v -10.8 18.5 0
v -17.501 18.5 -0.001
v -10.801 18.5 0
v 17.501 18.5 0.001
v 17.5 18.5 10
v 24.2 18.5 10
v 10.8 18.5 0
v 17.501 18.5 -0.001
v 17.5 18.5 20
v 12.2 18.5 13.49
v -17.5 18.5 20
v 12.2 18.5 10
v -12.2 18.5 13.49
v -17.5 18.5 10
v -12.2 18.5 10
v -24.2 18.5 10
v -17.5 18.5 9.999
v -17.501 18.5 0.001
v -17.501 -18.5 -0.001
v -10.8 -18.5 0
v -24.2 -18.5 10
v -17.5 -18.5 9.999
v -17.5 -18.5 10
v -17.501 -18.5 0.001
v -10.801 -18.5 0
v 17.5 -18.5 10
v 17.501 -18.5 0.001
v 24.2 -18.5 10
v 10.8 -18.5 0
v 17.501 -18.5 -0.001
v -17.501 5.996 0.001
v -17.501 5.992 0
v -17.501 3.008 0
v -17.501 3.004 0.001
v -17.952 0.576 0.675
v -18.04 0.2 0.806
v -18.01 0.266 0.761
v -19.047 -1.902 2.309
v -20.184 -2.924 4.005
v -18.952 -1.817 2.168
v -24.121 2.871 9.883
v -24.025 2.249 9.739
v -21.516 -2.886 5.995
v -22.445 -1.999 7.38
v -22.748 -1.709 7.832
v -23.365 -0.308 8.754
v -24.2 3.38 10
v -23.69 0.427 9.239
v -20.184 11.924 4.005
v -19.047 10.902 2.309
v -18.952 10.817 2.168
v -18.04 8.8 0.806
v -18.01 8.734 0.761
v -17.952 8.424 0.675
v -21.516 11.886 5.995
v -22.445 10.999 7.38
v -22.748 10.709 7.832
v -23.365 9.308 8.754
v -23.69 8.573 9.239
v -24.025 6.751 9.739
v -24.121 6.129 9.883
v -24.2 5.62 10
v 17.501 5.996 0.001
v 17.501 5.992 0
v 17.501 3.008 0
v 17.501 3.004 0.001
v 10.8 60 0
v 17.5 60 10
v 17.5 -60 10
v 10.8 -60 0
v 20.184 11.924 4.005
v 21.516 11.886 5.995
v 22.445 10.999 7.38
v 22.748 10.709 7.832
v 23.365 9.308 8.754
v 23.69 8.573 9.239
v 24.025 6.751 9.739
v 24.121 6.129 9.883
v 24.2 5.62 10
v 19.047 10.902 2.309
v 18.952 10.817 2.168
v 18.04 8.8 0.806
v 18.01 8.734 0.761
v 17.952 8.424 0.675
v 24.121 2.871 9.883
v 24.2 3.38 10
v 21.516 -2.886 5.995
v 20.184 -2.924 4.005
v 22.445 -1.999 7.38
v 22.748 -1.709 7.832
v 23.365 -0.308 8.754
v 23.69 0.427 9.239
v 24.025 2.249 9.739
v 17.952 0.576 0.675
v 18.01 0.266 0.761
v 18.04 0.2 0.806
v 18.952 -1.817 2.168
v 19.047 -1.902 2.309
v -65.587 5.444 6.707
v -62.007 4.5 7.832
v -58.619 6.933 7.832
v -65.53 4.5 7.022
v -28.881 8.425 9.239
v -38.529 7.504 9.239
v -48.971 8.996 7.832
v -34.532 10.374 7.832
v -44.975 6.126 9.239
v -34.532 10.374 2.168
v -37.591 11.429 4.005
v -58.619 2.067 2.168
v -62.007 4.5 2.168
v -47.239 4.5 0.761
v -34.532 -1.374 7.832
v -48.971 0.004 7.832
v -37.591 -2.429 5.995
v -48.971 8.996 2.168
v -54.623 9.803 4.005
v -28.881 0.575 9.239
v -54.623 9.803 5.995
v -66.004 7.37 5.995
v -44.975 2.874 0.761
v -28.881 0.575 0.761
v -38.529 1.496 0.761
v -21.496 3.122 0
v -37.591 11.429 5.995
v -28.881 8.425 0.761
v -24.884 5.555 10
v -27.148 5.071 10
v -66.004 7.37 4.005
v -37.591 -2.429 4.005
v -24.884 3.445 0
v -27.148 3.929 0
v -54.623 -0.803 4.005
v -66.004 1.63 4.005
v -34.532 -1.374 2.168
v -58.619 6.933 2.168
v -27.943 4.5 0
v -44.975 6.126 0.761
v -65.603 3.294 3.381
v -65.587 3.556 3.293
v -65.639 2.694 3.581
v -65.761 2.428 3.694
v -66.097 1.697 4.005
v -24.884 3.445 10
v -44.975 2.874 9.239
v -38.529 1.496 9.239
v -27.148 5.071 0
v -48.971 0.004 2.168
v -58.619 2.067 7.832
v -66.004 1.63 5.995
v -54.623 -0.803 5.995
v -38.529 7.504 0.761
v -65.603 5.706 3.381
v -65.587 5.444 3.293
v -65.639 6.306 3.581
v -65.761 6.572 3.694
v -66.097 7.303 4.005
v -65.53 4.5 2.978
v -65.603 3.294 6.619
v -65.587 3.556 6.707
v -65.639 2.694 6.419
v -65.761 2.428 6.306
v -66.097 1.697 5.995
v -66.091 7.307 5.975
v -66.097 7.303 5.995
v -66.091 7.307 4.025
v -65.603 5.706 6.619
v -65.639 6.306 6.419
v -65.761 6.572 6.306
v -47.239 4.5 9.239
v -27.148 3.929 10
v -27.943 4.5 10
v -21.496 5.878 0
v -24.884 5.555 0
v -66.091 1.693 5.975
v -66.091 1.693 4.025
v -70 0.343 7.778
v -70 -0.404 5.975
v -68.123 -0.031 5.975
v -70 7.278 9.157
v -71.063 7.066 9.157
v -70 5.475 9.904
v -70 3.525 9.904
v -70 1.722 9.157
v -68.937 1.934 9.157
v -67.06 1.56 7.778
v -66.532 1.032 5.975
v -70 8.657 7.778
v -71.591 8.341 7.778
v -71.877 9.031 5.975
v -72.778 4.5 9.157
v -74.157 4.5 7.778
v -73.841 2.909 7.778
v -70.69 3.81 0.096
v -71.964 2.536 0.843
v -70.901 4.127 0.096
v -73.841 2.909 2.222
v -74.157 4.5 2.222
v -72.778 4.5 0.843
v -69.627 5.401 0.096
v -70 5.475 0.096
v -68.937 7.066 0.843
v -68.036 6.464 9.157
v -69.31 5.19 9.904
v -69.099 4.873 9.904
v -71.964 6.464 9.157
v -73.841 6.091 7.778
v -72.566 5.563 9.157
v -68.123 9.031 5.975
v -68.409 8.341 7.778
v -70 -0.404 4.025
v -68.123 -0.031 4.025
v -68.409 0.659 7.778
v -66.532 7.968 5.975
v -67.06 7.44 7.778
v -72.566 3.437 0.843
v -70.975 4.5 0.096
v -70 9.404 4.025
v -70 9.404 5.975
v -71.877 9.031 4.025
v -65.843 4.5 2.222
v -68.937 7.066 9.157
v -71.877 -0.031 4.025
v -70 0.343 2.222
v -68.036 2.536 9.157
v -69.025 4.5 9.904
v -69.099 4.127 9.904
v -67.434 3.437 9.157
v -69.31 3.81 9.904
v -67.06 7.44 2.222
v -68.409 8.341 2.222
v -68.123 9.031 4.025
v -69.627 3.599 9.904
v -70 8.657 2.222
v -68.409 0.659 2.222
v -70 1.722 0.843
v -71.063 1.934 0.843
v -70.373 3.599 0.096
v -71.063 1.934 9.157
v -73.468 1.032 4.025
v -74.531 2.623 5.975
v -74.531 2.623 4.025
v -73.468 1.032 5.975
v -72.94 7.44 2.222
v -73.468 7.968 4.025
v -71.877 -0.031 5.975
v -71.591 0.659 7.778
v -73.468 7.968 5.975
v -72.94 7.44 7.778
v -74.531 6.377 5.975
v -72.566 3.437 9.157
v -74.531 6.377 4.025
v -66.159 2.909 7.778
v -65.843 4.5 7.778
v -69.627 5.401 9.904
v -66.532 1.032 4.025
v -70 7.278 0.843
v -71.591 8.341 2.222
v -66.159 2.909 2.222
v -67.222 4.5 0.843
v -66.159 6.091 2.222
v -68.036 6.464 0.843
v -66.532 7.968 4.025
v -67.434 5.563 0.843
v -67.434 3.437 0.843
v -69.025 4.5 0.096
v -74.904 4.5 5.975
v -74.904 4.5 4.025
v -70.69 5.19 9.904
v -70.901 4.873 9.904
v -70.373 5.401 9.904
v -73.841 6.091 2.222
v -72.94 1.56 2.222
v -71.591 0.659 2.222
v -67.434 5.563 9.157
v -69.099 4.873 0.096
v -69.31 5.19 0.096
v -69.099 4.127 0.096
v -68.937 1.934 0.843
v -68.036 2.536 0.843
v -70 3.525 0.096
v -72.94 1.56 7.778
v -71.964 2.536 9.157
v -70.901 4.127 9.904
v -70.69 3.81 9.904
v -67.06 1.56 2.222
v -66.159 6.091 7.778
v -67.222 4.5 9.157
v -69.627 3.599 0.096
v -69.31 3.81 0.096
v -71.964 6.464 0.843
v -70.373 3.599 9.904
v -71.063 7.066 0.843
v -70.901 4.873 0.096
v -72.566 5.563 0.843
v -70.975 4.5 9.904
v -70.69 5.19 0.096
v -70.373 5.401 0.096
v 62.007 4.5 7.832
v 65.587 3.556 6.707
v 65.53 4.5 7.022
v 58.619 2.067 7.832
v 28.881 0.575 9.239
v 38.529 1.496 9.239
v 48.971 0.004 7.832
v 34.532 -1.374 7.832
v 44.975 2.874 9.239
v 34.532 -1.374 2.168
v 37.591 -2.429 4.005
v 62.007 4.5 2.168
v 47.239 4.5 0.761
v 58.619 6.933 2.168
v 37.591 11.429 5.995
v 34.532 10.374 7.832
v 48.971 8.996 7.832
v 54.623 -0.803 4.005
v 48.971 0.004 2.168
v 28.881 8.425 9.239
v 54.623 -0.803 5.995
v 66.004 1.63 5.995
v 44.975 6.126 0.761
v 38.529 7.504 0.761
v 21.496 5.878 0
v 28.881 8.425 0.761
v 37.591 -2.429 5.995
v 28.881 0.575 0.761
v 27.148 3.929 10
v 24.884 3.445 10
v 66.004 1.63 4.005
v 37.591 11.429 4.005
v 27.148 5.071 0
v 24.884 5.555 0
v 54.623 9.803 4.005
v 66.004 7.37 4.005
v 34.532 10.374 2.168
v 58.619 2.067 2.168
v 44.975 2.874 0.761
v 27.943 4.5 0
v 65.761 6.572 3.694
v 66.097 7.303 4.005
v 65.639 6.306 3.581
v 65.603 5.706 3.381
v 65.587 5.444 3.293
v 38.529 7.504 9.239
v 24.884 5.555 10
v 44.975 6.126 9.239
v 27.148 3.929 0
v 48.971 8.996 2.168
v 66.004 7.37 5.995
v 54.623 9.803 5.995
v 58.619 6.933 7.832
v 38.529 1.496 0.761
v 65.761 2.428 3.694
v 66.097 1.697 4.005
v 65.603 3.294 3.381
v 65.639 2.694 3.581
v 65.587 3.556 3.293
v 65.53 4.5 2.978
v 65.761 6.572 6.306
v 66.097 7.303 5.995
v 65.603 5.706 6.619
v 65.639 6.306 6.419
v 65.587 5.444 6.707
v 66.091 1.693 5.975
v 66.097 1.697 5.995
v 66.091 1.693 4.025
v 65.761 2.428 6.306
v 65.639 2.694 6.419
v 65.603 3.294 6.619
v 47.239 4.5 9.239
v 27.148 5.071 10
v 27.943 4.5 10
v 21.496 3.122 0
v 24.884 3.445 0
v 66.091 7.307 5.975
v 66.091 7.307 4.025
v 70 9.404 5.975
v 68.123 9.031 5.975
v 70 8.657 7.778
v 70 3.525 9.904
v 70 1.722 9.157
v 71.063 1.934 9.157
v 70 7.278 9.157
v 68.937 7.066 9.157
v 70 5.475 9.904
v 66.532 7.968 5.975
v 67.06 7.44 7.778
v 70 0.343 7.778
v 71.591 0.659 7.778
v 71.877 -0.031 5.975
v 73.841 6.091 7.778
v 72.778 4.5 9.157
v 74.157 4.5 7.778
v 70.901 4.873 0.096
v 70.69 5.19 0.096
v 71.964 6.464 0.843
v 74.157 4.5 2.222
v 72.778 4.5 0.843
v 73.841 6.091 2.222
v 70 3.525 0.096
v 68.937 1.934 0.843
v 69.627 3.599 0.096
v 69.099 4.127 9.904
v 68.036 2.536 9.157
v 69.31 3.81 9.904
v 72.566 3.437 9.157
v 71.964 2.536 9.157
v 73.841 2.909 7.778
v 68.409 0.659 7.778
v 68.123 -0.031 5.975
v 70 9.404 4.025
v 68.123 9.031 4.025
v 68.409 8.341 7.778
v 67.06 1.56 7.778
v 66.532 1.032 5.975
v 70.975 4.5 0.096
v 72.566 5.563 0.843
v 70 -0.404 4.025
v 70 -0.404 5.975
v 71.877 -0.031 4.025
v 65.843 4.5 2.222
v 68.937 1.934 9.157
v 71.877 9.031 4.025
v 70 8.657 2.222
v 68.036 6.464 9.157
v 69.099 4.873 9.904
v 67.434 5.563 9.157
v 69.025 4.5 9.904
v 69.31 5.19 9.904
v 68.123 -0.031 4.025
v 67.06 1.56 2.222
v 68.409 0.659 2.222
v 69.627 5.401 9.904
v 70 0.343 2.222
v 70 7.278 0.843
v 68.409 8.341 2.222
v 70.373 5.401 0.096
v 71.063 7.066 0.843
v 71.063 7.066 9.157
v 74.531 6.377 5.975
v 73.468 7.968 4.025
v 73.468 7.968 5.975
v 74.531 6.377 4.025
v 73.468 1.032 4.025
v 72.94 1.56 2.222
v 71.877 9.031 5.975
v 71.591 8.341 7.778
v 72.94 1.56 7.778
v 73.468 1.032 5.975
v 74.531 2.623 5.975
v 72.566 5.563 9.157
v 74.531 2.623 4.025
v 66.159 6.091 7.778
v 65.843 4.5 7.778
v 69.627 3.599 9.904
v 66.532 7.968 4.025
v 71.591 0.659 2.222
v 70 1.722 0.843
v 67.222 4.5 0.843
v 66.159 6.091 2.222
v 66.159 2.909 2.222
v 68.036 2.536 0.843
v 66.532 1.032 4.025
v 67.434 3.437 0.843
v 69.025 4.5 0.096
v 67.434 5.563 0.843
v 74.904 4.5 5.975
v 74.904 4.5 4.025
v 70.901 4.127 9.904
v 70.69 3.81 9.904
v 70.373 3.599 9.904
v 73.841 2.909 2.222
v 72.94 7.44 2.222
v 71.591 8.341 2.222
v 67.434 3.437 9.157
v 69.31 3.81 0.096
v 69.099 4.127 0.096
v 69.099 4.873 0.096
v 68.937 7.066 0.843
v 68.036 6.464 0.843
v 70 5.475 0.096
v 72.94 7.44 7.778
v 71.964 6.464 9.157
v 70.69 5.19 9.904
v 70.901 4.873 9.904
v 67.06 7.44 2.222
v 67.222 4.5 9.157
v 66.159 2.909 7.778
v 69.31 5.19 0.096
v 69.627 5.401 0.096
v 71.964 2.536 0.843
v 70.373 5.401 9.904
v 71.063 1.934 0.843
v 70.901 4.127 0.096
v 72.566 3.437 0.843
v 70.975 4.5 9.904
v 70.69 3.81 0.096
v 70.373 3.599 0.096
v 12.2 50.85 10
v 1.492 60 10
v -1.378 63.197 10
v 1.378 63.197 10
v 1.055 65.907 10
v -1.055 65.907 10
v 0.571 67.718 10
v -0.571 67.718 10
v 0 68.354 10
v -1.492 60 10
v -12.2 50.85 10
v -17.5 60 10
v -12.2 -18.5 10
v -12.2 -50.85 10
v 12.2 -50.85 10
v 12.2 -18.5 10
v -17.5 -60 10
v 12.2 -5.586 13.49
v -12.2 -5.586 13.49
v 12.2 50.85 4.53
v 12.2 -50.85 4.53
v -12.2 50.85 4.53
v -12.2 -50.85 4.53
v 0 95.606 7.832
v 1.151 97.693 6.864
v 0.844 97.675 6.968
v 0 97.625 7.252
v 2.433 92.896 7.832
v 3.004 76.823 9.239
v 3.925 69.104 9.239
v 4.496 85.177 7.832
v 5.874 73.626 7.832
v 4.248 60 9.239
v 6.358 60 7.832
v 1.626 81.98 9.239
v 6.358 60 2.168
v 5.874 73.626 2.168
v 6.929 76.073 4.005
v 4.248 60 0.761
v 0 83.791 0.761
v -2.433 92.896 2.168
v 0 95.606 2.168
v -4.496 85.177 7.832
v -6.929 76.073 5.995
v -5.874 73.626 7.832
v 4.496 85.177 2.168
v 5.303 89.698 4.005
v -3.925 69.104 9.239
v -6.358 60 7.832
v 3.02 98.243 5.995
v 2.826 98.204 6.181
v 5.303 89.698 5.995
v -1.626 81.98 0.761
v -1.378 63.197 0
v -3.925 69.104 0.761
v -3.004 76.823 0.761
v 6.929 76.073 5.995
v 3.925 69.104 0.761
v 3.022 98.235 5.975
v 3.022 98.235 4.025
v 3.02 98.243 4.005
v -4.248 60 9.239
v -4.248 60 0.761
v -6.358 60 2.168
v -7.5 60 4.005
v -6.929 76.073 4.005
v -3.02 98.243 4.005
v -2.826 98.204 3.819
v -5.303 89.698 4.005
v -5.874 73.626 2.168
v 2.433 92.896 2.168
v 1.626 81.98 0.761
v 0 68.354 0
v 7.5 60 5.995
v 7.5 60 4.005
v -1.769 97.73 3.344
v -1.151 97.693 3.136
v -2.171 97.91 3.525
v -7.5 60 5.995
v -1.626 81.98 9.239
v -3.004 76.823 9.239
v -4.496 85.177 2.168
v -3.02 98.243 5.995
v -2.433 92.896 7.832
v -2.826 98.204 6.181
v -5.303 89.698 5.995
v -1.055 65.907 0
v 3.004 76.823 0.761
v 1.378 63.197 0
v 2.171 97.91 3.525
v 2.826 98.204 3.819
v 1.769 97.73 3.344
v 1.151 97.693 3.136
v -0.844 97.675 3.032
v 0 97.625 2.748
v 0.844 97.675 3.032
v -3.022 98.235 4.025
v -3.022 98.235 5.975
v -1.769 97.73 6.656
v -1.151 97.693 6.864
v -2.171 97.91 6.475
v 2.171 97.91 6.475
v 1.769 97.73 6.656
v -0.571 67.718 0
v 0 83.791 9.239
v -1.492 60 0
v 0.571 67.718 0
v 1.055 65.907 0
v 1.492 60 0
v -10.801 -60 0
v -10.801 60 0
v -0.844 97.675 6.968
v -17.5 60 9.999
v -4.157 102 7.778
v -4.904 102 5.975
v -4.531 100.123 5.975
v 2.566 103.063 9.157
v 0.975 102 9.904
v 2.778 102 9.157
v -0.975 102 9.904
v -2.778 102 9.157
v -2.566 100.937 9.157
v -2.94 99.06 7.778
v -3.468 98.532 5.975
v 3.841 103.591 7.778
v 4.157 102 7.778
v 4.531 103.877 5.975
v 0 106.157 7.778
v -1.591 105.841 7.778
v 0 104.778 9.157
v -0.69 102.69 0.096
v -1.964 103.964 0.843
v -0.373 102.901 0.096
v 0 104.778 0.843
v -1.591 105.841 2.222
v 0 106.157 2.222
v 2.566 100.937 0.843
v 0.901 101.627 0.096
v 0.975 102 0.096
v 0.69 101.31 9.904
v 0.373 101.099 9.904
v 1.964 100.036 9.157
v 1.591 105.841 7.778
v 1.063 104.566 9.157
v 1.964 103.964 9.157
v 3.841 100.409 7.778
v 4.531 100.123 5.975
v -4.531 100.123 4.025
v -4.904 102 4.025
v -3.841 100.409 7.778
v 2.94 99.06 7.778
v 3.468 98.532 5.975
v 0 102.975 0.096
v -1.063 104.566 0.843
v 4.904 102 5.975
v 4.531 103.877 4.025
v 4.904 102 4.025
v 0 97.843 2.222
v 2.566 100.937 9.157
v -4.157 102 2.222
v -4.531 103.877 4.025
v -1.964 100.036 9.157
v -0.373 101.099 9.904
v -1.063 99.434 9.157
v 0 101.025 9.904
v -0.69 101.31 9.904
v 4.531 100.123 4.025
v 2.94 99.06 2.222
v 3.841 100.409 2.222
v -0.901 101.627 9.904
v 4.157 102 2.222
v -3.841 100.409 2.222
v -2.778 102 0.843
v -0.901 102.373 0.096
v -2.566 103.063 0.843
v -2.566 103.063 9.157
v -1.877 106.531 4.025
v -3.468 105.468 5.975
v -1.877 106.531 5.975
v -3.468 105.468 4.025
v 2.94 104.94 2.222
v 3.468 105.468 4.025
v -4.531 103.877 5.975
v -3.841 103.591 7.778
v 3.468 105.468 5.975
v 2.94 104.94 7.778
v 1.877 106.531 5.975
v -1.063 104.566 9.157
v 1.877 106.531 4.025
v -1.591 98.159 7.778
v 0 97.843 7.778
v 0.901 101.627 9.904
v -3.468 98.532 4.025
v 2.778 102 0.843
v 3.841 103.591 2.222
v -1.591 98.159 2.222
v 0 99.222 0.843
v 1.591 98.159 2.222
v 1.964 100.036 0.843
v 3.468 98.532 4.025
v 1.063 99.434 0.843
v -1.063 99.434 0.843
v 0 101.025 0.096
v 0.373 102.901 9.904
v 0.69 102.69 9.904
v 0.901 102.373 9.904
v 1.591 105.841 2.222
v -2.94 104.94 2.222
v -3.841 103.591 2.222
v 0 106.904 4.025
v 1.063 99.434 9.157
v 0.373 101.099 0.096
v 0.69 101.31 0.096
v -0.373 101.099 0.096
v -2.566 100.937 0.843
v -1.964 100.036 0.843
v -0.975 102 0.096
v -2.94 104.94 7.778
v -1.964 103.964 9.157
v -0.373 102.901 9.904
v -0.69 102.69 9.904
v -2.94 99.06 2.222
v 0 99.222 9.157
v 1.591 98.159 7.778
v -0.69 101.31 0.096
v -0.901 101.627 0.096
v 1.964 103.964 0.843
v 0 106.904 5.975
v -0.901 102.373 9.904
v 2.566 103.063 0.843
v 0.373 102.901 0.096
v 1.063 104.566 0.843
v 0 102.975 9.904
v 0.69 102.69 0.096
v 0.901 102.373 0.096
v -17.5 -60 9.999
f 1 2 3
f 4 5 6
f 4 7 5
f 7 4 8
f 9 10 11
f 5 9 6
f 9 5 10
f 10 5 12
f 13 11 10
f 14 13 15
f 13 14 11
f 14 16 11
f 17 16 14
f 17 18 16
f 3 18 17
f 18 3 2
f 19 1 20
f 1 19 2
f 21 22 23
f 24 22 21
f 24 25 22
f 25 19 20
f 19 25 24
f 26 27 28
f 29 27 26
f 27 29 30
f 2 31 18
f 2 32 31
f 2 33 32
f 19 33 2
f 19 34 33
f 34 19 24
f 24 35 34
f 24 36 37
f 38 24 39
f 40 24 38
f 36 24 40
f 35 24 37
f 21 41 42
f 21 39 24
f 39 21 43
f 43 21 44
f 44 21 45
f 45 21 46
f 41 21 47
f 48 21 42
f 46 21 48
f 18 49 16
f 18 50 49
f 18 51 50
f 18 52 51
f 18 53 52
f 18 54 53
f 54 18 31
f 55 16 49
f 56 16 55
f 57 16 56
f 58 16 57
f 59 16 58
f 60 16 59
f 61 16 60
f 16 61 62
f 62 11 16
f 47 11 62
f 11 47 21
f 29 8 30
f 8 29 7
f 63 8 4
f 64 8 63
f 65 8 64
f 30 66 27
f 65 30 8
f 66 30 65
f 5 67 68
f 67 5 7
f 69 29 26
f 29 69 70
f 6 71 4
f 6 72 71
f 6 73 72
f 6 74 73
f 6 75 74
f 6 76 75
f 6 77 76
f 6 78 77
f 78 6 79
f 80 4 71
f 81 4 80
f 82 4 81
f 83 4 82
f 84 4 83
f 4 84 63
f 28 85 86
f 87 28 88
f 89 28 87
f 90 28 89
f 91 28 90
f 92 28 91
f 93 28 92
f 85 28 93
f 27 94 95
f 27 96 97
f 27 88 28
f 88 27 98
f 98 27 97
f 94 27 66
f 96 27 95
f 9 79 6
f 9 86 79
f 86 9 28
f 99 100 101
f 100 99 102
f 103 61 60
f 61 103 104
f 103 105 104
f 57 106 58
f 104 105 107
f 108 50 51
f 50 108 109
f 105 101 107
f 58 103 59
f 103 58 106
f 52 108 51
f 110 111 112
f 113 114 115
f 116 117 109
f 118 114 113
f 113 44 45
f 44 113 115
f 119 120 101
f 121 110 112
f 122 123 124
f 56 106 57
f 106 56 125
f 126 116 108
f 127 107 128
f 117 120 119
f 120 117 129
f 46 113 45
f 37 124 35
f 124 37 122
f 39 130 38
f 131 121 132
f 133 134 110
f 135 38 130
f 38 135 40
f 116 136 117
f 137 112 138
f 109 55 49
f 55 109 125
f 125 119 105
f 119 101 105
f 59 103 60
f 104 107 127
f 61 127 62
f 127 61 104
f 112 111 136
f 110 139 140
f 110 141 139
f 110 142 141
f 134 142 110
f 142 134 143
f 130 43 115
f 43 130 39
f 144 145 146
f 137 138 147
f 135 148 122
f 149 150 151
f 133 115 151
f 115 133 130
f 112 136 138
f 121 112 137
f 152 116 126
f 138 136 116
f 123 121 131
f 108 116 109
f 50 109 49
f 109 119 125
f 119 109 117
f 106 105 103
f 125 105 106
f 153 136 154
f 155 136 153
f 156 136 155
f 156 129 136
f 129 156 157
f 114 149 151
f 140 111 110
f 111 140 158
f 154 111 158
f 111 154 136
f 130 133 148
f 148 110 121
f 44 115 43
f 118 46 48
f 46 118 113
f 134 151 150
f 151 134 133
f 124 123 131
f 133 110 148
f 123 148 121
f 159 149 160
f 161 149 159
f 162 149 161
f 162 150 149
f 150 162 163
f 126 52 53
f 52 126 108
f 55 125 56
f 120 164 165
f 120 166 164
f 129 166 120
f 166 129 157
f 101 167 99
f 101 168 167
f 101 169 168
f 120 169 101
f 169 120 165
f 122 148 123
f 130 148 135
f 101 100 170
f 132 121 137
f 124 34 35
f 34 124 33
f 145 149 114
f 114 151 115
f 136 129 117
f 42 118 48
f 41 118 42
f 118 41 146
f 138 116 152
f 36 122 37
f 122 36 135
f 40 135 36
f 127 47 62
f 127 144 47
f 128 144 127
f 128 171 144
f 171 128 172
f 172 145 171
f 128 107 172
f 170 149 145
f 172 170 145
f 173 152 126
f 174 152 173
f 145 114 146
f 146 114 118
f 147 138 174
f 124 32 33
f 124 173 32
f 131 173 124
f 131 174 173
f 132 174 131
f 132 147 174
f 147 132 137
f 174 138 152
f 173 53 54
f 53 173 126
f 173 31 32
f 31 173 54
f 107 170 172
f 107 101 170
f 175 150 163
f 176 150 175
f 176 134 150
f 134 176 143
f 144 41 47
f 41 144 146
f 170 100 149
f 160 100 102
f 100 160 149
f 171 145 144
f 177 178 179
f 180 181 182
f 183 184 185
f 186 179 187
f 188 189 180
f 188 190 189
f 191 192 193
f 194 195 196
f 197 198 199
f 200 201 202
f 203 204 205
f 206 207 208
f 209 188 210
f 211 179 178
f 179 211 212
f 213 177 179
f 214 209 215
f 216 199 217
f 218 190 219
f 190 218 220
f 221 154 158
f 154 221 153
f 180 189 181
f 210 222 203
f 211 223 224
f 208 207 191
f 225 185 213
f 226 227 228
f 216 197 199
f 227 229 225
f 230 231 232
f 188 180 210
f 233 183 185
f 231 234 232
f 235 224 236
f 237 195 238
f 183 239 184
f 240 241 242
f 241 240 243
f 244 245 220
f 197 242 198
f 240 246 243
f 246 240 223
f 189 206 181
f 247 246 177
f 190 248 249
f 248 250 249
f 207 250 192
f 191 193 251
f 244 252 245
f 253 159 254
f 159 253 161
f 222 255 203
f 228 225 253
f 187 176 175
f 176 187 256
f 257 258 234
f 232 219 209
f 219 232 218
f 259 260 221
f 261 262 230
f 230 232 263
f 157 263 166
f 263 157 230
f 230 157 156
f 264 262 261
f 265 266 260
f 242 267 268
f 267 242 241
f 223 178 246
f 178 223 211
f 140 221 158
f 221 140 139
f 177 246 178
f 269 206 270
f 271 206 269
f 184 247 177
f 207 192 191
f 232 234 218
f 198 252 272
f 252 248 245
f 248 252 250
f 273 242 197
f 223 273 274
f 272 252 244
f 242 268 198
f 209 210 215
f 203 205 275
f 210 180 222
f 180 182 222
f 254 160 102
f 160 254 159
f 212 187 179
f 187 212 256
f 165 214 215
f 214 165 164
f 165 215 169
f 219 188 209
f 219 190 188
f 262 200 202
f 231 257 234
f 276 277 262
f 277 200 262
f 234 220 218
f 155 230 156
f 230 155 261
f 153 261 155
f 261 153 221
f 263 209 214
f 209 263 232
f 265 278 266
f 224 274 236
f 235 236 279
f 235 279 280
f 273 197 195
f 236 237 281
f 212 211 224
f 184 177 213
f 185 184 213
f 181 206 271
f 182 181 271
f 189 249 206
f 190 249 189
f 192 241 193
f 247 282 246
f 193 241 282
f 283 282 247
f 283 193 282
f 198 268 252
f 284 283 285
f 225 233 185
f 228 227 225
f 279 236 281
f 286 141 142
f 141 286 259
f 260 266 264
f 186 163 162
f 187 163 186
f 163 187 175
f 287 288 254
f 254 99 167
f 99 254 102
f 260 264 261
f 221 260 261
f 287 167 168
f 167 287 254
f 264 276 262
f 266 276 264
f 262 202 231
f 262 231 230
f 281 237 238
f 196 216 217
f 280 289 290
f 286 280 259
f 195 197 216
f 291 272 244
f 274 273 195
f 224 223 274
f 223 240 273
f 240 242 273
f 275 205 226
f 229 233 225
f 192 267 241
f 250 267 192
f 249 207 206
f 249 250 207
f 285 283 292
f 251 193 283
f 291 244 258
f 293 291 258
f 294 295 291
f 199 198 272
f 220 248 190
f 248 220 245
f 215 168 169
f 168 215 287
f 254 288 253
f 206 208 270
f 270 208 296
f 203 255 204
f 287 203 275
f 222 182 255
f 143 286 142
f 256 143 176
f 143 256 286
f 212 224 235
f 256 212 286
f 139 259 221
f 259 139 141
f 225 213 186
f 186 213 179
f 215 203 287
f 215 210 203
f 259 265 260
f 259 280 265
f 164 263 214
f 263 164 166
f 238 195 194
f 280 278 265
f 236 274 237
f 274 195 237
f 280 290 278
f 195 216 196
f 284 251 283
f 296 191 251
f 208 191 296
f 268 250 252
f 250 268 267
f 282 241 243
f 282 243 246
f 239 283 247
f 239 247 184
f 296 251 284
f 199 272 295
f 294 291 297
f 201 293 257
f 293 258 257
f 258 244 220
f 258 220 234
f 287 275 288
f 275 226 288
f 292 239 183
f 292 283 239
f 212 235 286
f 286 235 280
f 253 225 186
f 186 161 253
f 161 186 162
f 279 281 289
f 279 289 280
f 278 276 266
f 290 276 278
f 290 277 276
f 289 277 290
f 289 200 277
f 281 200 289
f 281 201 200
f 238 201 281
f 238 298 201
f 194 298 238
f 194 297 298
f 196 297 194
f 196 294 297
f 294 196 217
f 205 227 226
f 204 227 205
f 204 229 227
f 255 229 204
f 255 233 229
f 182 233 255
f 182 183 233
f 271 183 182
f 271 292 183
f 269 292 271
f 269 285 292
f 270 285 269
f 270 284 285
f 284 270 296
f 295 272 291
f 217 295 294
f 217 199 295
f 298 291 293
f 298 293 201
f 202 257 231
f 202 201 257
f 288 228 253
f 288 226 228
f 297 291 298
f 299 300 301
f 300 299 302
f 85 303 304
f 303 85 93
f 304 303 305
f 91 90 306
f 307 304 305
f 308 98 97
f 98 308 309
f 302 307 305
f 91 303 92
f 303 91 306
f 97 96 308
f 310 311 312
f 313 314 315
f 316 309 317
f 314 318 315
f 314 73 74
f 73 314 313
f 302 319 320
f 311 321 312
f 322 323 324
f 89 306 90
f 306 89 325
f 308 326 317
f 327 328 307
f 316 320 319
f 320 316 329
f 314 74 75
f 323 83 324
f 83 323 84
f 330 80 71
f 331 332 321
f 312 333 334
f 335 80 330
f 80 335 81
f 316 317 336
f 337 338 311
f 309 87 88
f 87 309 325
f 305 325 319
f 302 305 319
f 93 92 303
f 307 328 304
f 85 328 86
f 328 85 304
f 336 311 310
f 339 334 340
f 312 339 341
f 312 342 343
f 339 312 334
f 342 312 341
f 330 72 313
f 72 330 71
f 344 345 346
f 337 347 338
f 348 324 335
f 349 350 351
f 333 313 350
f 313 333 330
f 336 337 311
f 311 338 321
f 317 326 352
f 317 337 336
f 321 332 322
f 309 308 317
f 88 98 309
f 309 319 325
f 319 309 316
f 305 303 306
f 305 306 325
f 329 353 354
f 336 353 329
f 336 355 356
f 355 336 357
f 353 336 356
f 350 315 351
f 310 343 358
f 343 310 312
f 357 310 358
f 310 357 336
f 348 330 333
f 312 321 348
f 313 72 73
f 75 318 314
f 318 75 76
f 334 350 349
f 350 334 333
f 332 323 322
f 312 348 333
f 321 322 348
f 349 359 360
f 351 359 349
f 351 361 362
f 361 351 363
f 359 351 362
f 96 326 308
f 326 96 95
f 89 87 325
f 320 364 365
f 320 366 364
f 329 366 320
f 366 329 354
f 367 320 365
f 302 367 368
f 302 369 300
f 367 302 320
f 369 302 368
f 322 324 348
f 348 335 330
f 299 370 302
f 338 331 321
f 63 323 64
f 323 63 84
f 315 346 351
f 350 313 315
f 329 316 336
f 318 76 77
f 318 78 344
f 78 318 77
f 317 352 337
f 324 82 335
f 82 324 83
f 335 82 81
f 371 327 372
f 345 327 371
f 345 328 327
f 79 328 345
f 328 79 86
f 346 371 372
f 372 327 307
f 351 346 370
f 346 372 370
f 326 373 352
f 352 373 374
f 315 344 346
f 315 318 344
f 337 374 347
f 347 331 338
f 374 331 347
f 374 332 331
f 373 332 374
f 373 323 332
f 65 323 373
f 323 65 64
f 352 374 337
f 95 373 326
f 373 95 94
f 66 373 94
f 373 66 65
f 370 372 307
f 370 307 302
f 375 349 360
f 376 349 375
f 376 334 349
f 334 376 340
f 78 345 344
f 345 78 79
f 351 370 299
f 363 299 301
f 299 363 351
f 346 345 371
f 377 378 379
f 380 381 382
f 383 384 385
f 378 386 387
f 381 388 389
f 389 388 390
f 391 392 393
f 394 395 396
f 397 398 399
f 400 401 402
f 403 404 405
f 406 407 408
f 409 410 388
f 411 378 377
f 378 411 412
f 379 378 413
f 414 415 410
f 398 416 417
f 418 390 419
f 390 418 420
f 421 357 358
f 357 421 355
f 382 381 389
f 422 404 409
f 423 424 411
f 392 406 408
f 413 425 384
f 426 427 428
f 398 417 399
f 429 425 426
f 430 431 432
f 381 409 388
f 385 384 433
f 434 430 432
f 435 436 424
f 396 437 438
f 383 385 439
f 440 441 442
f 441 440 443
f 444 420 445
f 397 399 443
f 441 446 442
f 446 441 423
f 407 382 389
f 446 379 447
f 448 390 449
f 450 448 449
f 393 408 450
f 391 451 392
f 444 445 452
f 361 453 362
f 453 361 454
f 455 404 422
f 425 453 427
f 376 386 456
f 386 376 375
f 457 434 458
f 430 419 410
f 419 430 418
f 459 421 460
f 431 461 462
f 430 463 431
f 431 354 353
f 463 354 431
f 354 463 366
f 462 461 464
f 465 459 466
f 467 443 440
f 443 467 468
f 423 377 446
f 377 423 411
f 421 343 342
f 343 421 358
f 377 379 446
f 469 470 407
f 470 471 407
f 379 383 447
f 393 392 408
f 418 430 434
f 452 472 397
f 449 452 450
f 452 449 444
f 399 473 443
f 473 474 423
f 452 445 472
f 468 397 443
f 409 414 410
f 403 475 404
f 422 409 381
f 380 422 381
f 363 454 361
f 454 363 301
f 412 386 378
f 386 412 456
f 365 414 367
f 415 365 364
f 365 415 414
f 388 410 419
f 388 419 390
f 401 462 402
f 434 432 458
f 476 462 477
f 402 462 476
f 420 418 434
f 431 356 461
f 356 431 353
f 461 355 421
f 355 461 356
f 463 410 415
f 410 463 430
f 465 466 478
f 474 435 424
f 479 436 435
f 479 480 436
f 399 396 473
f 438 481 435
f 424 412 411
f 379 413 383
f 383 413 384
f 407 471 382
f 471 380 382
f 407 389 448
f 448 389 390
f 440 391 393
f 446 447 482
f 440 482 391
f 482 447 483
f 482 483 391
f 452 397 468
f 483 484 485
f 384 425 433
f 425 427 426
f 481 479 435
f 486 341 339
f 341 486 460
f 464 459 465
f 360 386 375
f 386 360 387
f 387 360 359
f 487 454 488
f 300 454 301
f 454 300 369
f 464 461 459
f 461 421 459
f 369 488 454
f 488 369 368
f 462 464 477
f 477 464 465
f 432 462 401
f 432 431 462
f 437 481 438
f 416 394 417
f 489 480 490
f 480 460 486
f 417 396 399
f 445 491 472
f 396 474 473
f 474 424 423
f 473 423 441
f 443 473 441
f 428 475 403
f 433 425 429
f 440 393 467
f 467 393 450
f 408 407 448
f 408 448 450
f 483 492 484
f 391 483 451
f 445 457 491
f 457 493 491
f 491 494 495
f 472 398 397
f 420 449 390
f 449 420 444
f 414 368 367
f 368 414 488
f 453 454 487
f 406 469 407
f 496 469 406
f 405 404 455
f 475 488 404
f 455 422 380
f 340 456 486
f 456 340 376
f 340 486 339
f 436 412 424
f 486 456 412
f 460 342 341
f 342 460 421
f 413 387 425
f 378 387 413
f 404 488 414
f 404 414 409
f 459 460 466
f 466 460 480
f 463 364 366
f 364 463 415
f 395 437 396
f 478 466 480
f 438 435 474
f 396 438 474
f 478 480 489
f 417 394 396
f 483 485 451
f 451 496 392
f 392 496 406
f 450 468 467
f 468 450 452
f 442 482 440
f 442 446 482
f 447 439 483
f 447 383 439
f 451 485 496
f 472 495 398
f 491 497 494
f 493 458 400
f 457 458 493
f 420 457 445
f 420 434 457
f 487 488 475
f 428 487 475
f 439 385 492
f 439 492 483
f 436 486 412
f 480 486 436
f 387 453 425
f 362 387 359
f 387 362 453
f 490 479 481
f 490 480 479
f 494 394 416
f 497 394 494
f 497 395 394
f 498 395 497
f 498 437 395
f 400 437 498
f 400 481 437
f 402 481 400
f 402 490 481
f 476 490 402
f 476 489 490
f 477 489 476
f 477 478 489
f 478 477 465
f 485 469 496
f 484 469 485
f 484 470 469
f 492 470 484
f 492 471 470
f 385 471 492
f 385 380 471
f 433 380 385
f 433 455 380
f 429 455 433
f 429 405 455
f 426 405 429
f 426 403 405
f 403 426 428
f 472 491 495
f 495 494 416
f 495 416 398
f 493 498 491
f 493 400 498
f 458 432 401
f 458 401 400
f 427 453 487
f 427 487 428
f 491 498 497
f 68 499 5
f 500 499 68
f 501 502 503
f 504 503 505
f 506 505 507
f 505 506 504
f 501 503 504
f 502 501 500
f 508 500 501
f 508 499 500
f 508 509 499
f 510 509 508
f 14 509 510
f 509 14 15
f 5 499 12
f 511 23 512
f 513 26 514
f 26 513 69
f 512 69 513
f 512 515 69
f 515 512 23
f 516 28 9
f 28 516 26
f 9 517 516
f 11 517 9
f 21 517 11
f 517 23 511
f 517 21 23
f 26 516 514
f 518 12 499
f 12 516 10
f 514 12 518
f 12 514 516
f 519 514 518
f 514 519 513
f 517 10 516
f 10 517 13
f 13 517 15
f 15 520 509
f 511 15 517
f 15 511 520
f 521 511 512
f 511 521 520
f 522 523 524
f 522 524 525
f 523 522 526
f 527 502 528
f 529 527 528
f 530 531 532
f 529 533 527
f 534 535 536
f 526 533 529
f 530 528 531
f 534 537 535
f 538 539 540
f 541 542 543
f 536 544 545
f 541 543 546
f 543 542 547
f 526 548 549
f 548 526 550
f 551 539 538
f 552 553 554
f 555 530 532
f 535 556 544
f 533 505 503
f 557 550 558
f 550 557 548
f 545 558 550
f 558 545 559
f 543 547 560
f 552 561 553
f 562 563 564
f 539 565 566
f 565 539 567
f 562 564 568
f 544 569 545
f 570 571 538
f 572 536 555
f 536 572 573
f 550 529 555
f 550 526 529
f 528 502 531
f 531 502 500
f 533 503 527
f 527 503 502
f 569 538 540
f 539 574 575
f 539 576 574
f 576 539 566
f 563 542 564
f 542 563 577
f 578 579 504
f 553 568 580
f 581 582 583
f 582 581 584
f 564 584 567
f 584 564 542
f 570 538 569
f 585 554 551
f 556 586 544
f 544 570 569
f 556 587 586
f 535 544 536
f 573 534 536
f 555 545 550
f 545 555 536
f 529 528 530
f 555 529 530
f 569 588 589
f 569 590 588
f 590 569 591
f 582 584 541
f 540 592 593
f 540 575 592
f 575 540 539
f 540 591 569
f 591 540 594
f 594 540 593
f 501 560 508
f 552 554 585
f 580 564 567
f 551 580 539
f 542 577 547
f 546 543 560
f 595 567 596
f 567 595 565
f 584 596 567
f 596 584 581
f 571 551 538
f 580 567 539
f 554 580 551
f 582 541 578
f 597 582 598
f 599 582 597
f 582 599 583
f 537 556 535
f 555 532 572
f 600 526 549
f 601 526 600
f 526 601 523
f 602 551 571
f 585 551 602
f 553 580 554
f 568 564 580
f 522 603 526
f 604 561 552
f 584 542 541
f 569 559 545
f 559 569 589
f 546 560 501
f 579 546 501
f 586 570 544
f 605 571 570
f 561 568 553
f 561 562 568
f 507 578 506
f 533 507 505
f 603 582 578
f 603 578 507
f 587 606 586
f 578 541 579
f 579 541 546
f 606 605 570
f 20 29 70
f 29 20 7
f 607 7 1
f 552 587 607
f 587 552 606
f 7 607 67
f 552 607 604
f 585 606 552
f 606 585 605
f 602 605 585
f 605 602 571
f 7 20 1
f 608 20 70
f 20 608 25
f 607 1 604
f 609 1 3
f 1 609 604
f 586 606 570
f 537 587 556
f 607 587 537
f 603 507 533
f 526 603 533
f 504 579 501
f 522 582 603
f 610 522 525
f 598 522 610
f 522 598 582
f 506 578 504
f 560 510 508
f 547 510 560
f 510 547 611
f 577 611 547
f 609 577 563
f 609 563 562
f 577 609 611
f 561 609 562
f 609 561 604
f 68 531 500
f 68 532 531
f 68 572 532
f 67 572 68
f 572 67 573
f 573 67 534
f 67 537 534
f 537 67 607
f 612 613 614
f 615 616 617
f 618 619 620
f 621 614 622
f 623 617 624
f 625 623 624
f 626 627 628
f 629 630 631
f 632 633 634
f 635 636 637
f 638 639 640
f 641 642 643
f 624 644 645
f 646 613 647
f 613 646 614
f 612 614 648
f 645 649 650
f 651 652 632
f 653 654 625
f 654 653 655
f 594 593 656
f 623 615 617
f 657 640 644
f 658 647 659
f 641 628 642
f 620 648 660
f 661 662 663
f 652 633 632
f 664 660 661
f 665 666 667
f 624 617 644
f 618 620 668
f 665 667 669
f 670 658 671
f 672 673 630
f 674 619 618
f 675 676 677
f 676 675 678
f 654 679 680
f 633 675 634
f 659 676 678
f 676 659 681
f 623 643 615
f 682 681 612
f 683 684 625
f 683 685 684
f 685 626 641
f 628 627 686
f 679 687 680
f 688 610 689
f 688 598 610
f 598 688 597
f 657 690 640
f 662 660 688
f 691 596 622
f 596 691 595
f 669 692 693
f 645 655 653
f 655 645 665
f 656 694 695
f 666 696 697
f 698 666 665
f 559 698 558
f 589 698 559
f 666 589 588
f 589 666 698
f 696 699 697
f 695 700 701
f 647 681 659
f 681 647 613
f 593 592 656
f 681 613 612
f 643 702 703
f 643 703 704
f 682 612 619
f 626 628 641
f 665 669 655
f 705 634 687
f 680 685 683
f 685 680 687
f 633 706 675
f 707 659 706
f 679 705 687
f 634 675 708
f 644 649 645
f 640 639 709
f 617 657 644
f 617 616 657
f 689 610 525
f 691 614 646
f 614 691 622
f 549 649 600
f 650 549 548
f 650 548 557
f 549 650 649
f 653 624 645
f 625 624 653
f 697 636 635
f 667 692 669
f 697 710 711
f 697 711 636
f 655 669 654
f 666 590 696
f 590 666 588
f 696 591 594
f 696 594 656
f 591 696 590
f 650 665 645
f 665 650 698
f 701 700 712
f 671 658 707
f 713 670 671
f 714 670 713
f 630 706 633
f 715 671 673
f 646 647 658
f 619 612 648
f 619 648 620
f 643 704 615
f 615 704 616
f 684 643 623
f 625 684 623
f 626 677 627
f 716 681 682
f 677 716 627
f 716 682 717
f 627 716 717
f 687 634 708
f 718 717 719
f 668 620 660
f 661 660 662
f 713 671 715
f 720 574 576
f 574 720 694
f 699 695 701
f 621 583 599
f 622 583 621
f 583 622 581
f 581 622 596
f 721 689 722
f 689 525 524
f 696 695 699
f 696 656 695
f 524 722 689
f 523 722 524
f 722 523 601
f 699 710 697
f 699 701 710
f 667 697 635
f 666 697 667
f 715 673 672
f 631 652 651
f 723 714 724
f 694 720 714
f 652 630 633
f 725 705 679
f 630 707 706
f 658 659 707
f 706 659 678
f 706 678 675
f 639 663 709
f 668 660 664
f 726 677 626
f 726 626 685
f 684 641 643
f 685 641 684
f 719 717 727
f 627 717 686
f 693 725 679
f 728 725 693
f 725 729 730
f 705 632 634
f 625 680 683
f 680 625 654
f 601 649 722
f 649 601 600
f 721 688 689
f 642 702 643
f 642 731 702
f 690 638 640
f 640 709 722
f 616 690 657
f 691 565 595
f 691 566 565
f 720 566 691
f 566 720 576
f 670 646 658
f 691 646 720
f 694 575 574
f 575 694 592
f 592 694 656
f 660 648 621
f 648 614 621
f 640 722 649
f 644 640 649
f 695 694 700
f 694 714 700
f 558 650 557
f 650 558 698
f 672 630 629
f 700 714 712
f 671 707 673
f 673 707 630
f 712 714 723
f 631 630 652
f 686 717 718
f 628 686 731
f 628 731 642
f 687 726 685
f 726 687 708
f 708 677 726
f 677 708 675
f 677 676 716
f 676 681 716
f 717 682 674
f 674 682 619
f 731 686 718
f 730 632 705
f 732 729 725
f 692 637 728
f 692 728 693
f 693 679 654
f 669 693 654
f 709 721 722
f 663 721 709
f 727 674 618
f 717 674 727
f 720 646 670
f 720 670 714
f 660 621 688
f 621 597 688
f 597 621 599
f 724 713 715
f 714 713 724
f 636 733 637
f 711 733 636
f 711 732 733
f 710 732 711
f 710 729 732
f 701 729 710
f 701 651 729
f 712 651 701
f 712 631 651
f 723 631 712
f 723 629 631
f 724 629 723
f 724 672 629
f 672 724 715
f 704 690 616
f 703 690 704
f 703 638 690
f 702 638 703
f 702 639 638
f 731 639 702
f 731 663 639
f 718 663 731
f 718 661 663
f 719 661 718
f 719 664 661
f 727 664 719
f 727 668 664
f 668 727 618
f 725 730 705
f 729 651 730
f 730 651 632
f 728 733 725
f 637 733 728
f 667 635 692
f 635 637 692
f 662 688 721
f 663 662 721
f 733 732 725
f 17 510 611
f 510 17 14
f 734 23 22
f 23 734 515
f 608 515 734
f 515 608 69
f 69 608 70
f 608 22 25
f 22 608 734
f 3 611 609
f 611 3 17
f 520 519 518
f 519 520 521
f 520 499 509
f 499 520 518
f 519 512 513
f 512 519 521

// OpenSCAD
// $fa = 1;
// $fs = 0.4;

OVERLAP_FIXER_THING = 0.0008;

// Guide
GUIDE_DEPTH = 37;
GUIDE_WIDTH = 35;
GUIDE_HEIGHT = 10;
// Holder Base
BASE_WIDTH = 35;
BASE_DEPTH = 120;
BASE_HEIGHT = 10;
// Grinding Stone
//24.33
STONE_WIDTH = 24.4;
//101.6
STONE_DEPTH = 101.7;
//6.95
STONE_HEIGHT = 6.98;


module Handle(x=10, y=100, z=10, diameter=10) {
 
    translate([0,y/2,0]){
        sphere(d=diameter);
    }
    intersection(){
        resize([x, y, z]){
            sphere(d=diameter);
        }
        translate([0, y/4 + diameter/4, 0]) {
            cube([x, y/2 + diameter/2, y], true);
        }
    }
}

module GuideRail(length) {
    rotate([90, 0, 0]) 
    linear_extrude(height = length, center = true, convexity = 10, twist = 0)
        polygon(points=[[0 - OVERLAP_FIXER_THING,0 - OVERLAP_FIXER_THING],[BASE_HEIGHT*.67,0],[0,BASE_HEIGHT]], center=true);
}

module BaseBody() {
    cube([BASE_WIDTH, BASE_DEPTH, BASE_HEIGHT], true);
    translate([0, BASE_DEPTH/2, 0]){
        Handle(y = BASE_DEPTH*.7, x=15); 
    }
    // rotate([0, 0, 180]) {
    //     translate([0, BASE_DEPTH/2, 0]){
    //         Handle(y = BASE_DEPTH*.7, x=15); 
    //     }
    // }
}

module Stone() {
    cube([STONE_WIDTH, STONE_DEPTH, STONE_HEIGHT + OVERLAP_FIXER_THING], true);
}


module Base() {
    difference(){
        // translate([0, 0, BASE_HEIGHT/2]){
        BaseBody();
        translate([BASE_WIDTH/2, 0, -BASE_HEIGHT/2]){
            rotate([0,0,180]){
                GuideRail(BASE_DEPTH + OVERLAP_FIXER_THING);
            }
        }
        translate([-BASE_WIDTH/2 - OVERLAP_FIXER_THING, 0, -BASE_HEIGHT/2]){
            GuideRail(BASE_DEPTH + OVERLAP_FIXER_THING);
        }
        translate([0, 0, BASE_HEIGHT-STONE_HEIGHT]){
            Stone();
        }
    }
}


module GuideIndent(args) {
        cube([STONE_WIDTH, GUIDE_DEPTH + OVERLAP_FIXER_THING, STONE_HEIGHT + OVERLAP_FIXER_THING], true);
}

module GuideSlant() {
    translate([0, -GUIDE_DEPTH/2, GUIDE_HEIGHT]) {     
        rotate([90, 90, 90]){
            linear_extrude(height = GUIDE_WIDTH * 3, center = true, convexity = 10, twist = 0){
                polygon(points=[[0 - OVERLAP_FIXER_THING,0 - OVERLAP_FIXER_THING],[GUIDE_HEIGHT,0],[0,GUIDE_DEPTH]], center=true);
            }
        }
    }
}

module GuideBody(){
    cube([GUIDE_WIDTH, GUIDE_DEPTH, GUIDE_HEIGHT], true);
}

module GuideSide() {
    translate([-BASE_WIDTH/2, 0, -GUIDE_HEIGHT]) {
        rotate([0, 0, 0]) {
            #GuideRail(GUIDE_DEPTH);
        }
    }
    translate([-BASE_WIDTH/2, 0, 0]) {
        rotate([180, 0, 180]) {
            GuideRail(GUIDE_DEPTH);
        }
    }
    rotate([0, 0, 180]) {
        translate([BASE_WIDTH/2, 0, 0]) {
            GuideRail(GUIDE_DEPTH);
        }
    } 
}

module Guide() {
    difference() {
        union() {
            GuideSide();
            rotate([0, 0, 180]) {
                GuideSide();
            } 
            translate([0, 0, 5]){
                GuideBody();
            }
            translate([-BASE_WIDTH/2, 4.5, -5]) {
                rotate([0, 0, 90]) {
                    Handle(y = GUIDE_WIDTH*3, x=15);
                }                  
            }
            translate([BASE_WIDTH/2, 4.5, -5]) {
                rotate([0, 0, -90]) {
                    Handle(y = GUIDE_WIDTH*3, x=15);
                }                  
            }
        }
        GuideSlant();
        GuideIndent();
    }
}



// FOR DISPLAY AND WORKING
translate([0, 0, GUIDE_HEIGHT]) {
    Guide();
}
translate([0, 0, BASE_HEIGHT/2]) {
    Base();
}
// GuideSide();

// FOR PRINTING
// translate([0, 0, GUIDE_DEPTH/2]) {
//     rotate([-90, 0, 0]) {
//         Guide(); 
//     }
// }
// Base();
